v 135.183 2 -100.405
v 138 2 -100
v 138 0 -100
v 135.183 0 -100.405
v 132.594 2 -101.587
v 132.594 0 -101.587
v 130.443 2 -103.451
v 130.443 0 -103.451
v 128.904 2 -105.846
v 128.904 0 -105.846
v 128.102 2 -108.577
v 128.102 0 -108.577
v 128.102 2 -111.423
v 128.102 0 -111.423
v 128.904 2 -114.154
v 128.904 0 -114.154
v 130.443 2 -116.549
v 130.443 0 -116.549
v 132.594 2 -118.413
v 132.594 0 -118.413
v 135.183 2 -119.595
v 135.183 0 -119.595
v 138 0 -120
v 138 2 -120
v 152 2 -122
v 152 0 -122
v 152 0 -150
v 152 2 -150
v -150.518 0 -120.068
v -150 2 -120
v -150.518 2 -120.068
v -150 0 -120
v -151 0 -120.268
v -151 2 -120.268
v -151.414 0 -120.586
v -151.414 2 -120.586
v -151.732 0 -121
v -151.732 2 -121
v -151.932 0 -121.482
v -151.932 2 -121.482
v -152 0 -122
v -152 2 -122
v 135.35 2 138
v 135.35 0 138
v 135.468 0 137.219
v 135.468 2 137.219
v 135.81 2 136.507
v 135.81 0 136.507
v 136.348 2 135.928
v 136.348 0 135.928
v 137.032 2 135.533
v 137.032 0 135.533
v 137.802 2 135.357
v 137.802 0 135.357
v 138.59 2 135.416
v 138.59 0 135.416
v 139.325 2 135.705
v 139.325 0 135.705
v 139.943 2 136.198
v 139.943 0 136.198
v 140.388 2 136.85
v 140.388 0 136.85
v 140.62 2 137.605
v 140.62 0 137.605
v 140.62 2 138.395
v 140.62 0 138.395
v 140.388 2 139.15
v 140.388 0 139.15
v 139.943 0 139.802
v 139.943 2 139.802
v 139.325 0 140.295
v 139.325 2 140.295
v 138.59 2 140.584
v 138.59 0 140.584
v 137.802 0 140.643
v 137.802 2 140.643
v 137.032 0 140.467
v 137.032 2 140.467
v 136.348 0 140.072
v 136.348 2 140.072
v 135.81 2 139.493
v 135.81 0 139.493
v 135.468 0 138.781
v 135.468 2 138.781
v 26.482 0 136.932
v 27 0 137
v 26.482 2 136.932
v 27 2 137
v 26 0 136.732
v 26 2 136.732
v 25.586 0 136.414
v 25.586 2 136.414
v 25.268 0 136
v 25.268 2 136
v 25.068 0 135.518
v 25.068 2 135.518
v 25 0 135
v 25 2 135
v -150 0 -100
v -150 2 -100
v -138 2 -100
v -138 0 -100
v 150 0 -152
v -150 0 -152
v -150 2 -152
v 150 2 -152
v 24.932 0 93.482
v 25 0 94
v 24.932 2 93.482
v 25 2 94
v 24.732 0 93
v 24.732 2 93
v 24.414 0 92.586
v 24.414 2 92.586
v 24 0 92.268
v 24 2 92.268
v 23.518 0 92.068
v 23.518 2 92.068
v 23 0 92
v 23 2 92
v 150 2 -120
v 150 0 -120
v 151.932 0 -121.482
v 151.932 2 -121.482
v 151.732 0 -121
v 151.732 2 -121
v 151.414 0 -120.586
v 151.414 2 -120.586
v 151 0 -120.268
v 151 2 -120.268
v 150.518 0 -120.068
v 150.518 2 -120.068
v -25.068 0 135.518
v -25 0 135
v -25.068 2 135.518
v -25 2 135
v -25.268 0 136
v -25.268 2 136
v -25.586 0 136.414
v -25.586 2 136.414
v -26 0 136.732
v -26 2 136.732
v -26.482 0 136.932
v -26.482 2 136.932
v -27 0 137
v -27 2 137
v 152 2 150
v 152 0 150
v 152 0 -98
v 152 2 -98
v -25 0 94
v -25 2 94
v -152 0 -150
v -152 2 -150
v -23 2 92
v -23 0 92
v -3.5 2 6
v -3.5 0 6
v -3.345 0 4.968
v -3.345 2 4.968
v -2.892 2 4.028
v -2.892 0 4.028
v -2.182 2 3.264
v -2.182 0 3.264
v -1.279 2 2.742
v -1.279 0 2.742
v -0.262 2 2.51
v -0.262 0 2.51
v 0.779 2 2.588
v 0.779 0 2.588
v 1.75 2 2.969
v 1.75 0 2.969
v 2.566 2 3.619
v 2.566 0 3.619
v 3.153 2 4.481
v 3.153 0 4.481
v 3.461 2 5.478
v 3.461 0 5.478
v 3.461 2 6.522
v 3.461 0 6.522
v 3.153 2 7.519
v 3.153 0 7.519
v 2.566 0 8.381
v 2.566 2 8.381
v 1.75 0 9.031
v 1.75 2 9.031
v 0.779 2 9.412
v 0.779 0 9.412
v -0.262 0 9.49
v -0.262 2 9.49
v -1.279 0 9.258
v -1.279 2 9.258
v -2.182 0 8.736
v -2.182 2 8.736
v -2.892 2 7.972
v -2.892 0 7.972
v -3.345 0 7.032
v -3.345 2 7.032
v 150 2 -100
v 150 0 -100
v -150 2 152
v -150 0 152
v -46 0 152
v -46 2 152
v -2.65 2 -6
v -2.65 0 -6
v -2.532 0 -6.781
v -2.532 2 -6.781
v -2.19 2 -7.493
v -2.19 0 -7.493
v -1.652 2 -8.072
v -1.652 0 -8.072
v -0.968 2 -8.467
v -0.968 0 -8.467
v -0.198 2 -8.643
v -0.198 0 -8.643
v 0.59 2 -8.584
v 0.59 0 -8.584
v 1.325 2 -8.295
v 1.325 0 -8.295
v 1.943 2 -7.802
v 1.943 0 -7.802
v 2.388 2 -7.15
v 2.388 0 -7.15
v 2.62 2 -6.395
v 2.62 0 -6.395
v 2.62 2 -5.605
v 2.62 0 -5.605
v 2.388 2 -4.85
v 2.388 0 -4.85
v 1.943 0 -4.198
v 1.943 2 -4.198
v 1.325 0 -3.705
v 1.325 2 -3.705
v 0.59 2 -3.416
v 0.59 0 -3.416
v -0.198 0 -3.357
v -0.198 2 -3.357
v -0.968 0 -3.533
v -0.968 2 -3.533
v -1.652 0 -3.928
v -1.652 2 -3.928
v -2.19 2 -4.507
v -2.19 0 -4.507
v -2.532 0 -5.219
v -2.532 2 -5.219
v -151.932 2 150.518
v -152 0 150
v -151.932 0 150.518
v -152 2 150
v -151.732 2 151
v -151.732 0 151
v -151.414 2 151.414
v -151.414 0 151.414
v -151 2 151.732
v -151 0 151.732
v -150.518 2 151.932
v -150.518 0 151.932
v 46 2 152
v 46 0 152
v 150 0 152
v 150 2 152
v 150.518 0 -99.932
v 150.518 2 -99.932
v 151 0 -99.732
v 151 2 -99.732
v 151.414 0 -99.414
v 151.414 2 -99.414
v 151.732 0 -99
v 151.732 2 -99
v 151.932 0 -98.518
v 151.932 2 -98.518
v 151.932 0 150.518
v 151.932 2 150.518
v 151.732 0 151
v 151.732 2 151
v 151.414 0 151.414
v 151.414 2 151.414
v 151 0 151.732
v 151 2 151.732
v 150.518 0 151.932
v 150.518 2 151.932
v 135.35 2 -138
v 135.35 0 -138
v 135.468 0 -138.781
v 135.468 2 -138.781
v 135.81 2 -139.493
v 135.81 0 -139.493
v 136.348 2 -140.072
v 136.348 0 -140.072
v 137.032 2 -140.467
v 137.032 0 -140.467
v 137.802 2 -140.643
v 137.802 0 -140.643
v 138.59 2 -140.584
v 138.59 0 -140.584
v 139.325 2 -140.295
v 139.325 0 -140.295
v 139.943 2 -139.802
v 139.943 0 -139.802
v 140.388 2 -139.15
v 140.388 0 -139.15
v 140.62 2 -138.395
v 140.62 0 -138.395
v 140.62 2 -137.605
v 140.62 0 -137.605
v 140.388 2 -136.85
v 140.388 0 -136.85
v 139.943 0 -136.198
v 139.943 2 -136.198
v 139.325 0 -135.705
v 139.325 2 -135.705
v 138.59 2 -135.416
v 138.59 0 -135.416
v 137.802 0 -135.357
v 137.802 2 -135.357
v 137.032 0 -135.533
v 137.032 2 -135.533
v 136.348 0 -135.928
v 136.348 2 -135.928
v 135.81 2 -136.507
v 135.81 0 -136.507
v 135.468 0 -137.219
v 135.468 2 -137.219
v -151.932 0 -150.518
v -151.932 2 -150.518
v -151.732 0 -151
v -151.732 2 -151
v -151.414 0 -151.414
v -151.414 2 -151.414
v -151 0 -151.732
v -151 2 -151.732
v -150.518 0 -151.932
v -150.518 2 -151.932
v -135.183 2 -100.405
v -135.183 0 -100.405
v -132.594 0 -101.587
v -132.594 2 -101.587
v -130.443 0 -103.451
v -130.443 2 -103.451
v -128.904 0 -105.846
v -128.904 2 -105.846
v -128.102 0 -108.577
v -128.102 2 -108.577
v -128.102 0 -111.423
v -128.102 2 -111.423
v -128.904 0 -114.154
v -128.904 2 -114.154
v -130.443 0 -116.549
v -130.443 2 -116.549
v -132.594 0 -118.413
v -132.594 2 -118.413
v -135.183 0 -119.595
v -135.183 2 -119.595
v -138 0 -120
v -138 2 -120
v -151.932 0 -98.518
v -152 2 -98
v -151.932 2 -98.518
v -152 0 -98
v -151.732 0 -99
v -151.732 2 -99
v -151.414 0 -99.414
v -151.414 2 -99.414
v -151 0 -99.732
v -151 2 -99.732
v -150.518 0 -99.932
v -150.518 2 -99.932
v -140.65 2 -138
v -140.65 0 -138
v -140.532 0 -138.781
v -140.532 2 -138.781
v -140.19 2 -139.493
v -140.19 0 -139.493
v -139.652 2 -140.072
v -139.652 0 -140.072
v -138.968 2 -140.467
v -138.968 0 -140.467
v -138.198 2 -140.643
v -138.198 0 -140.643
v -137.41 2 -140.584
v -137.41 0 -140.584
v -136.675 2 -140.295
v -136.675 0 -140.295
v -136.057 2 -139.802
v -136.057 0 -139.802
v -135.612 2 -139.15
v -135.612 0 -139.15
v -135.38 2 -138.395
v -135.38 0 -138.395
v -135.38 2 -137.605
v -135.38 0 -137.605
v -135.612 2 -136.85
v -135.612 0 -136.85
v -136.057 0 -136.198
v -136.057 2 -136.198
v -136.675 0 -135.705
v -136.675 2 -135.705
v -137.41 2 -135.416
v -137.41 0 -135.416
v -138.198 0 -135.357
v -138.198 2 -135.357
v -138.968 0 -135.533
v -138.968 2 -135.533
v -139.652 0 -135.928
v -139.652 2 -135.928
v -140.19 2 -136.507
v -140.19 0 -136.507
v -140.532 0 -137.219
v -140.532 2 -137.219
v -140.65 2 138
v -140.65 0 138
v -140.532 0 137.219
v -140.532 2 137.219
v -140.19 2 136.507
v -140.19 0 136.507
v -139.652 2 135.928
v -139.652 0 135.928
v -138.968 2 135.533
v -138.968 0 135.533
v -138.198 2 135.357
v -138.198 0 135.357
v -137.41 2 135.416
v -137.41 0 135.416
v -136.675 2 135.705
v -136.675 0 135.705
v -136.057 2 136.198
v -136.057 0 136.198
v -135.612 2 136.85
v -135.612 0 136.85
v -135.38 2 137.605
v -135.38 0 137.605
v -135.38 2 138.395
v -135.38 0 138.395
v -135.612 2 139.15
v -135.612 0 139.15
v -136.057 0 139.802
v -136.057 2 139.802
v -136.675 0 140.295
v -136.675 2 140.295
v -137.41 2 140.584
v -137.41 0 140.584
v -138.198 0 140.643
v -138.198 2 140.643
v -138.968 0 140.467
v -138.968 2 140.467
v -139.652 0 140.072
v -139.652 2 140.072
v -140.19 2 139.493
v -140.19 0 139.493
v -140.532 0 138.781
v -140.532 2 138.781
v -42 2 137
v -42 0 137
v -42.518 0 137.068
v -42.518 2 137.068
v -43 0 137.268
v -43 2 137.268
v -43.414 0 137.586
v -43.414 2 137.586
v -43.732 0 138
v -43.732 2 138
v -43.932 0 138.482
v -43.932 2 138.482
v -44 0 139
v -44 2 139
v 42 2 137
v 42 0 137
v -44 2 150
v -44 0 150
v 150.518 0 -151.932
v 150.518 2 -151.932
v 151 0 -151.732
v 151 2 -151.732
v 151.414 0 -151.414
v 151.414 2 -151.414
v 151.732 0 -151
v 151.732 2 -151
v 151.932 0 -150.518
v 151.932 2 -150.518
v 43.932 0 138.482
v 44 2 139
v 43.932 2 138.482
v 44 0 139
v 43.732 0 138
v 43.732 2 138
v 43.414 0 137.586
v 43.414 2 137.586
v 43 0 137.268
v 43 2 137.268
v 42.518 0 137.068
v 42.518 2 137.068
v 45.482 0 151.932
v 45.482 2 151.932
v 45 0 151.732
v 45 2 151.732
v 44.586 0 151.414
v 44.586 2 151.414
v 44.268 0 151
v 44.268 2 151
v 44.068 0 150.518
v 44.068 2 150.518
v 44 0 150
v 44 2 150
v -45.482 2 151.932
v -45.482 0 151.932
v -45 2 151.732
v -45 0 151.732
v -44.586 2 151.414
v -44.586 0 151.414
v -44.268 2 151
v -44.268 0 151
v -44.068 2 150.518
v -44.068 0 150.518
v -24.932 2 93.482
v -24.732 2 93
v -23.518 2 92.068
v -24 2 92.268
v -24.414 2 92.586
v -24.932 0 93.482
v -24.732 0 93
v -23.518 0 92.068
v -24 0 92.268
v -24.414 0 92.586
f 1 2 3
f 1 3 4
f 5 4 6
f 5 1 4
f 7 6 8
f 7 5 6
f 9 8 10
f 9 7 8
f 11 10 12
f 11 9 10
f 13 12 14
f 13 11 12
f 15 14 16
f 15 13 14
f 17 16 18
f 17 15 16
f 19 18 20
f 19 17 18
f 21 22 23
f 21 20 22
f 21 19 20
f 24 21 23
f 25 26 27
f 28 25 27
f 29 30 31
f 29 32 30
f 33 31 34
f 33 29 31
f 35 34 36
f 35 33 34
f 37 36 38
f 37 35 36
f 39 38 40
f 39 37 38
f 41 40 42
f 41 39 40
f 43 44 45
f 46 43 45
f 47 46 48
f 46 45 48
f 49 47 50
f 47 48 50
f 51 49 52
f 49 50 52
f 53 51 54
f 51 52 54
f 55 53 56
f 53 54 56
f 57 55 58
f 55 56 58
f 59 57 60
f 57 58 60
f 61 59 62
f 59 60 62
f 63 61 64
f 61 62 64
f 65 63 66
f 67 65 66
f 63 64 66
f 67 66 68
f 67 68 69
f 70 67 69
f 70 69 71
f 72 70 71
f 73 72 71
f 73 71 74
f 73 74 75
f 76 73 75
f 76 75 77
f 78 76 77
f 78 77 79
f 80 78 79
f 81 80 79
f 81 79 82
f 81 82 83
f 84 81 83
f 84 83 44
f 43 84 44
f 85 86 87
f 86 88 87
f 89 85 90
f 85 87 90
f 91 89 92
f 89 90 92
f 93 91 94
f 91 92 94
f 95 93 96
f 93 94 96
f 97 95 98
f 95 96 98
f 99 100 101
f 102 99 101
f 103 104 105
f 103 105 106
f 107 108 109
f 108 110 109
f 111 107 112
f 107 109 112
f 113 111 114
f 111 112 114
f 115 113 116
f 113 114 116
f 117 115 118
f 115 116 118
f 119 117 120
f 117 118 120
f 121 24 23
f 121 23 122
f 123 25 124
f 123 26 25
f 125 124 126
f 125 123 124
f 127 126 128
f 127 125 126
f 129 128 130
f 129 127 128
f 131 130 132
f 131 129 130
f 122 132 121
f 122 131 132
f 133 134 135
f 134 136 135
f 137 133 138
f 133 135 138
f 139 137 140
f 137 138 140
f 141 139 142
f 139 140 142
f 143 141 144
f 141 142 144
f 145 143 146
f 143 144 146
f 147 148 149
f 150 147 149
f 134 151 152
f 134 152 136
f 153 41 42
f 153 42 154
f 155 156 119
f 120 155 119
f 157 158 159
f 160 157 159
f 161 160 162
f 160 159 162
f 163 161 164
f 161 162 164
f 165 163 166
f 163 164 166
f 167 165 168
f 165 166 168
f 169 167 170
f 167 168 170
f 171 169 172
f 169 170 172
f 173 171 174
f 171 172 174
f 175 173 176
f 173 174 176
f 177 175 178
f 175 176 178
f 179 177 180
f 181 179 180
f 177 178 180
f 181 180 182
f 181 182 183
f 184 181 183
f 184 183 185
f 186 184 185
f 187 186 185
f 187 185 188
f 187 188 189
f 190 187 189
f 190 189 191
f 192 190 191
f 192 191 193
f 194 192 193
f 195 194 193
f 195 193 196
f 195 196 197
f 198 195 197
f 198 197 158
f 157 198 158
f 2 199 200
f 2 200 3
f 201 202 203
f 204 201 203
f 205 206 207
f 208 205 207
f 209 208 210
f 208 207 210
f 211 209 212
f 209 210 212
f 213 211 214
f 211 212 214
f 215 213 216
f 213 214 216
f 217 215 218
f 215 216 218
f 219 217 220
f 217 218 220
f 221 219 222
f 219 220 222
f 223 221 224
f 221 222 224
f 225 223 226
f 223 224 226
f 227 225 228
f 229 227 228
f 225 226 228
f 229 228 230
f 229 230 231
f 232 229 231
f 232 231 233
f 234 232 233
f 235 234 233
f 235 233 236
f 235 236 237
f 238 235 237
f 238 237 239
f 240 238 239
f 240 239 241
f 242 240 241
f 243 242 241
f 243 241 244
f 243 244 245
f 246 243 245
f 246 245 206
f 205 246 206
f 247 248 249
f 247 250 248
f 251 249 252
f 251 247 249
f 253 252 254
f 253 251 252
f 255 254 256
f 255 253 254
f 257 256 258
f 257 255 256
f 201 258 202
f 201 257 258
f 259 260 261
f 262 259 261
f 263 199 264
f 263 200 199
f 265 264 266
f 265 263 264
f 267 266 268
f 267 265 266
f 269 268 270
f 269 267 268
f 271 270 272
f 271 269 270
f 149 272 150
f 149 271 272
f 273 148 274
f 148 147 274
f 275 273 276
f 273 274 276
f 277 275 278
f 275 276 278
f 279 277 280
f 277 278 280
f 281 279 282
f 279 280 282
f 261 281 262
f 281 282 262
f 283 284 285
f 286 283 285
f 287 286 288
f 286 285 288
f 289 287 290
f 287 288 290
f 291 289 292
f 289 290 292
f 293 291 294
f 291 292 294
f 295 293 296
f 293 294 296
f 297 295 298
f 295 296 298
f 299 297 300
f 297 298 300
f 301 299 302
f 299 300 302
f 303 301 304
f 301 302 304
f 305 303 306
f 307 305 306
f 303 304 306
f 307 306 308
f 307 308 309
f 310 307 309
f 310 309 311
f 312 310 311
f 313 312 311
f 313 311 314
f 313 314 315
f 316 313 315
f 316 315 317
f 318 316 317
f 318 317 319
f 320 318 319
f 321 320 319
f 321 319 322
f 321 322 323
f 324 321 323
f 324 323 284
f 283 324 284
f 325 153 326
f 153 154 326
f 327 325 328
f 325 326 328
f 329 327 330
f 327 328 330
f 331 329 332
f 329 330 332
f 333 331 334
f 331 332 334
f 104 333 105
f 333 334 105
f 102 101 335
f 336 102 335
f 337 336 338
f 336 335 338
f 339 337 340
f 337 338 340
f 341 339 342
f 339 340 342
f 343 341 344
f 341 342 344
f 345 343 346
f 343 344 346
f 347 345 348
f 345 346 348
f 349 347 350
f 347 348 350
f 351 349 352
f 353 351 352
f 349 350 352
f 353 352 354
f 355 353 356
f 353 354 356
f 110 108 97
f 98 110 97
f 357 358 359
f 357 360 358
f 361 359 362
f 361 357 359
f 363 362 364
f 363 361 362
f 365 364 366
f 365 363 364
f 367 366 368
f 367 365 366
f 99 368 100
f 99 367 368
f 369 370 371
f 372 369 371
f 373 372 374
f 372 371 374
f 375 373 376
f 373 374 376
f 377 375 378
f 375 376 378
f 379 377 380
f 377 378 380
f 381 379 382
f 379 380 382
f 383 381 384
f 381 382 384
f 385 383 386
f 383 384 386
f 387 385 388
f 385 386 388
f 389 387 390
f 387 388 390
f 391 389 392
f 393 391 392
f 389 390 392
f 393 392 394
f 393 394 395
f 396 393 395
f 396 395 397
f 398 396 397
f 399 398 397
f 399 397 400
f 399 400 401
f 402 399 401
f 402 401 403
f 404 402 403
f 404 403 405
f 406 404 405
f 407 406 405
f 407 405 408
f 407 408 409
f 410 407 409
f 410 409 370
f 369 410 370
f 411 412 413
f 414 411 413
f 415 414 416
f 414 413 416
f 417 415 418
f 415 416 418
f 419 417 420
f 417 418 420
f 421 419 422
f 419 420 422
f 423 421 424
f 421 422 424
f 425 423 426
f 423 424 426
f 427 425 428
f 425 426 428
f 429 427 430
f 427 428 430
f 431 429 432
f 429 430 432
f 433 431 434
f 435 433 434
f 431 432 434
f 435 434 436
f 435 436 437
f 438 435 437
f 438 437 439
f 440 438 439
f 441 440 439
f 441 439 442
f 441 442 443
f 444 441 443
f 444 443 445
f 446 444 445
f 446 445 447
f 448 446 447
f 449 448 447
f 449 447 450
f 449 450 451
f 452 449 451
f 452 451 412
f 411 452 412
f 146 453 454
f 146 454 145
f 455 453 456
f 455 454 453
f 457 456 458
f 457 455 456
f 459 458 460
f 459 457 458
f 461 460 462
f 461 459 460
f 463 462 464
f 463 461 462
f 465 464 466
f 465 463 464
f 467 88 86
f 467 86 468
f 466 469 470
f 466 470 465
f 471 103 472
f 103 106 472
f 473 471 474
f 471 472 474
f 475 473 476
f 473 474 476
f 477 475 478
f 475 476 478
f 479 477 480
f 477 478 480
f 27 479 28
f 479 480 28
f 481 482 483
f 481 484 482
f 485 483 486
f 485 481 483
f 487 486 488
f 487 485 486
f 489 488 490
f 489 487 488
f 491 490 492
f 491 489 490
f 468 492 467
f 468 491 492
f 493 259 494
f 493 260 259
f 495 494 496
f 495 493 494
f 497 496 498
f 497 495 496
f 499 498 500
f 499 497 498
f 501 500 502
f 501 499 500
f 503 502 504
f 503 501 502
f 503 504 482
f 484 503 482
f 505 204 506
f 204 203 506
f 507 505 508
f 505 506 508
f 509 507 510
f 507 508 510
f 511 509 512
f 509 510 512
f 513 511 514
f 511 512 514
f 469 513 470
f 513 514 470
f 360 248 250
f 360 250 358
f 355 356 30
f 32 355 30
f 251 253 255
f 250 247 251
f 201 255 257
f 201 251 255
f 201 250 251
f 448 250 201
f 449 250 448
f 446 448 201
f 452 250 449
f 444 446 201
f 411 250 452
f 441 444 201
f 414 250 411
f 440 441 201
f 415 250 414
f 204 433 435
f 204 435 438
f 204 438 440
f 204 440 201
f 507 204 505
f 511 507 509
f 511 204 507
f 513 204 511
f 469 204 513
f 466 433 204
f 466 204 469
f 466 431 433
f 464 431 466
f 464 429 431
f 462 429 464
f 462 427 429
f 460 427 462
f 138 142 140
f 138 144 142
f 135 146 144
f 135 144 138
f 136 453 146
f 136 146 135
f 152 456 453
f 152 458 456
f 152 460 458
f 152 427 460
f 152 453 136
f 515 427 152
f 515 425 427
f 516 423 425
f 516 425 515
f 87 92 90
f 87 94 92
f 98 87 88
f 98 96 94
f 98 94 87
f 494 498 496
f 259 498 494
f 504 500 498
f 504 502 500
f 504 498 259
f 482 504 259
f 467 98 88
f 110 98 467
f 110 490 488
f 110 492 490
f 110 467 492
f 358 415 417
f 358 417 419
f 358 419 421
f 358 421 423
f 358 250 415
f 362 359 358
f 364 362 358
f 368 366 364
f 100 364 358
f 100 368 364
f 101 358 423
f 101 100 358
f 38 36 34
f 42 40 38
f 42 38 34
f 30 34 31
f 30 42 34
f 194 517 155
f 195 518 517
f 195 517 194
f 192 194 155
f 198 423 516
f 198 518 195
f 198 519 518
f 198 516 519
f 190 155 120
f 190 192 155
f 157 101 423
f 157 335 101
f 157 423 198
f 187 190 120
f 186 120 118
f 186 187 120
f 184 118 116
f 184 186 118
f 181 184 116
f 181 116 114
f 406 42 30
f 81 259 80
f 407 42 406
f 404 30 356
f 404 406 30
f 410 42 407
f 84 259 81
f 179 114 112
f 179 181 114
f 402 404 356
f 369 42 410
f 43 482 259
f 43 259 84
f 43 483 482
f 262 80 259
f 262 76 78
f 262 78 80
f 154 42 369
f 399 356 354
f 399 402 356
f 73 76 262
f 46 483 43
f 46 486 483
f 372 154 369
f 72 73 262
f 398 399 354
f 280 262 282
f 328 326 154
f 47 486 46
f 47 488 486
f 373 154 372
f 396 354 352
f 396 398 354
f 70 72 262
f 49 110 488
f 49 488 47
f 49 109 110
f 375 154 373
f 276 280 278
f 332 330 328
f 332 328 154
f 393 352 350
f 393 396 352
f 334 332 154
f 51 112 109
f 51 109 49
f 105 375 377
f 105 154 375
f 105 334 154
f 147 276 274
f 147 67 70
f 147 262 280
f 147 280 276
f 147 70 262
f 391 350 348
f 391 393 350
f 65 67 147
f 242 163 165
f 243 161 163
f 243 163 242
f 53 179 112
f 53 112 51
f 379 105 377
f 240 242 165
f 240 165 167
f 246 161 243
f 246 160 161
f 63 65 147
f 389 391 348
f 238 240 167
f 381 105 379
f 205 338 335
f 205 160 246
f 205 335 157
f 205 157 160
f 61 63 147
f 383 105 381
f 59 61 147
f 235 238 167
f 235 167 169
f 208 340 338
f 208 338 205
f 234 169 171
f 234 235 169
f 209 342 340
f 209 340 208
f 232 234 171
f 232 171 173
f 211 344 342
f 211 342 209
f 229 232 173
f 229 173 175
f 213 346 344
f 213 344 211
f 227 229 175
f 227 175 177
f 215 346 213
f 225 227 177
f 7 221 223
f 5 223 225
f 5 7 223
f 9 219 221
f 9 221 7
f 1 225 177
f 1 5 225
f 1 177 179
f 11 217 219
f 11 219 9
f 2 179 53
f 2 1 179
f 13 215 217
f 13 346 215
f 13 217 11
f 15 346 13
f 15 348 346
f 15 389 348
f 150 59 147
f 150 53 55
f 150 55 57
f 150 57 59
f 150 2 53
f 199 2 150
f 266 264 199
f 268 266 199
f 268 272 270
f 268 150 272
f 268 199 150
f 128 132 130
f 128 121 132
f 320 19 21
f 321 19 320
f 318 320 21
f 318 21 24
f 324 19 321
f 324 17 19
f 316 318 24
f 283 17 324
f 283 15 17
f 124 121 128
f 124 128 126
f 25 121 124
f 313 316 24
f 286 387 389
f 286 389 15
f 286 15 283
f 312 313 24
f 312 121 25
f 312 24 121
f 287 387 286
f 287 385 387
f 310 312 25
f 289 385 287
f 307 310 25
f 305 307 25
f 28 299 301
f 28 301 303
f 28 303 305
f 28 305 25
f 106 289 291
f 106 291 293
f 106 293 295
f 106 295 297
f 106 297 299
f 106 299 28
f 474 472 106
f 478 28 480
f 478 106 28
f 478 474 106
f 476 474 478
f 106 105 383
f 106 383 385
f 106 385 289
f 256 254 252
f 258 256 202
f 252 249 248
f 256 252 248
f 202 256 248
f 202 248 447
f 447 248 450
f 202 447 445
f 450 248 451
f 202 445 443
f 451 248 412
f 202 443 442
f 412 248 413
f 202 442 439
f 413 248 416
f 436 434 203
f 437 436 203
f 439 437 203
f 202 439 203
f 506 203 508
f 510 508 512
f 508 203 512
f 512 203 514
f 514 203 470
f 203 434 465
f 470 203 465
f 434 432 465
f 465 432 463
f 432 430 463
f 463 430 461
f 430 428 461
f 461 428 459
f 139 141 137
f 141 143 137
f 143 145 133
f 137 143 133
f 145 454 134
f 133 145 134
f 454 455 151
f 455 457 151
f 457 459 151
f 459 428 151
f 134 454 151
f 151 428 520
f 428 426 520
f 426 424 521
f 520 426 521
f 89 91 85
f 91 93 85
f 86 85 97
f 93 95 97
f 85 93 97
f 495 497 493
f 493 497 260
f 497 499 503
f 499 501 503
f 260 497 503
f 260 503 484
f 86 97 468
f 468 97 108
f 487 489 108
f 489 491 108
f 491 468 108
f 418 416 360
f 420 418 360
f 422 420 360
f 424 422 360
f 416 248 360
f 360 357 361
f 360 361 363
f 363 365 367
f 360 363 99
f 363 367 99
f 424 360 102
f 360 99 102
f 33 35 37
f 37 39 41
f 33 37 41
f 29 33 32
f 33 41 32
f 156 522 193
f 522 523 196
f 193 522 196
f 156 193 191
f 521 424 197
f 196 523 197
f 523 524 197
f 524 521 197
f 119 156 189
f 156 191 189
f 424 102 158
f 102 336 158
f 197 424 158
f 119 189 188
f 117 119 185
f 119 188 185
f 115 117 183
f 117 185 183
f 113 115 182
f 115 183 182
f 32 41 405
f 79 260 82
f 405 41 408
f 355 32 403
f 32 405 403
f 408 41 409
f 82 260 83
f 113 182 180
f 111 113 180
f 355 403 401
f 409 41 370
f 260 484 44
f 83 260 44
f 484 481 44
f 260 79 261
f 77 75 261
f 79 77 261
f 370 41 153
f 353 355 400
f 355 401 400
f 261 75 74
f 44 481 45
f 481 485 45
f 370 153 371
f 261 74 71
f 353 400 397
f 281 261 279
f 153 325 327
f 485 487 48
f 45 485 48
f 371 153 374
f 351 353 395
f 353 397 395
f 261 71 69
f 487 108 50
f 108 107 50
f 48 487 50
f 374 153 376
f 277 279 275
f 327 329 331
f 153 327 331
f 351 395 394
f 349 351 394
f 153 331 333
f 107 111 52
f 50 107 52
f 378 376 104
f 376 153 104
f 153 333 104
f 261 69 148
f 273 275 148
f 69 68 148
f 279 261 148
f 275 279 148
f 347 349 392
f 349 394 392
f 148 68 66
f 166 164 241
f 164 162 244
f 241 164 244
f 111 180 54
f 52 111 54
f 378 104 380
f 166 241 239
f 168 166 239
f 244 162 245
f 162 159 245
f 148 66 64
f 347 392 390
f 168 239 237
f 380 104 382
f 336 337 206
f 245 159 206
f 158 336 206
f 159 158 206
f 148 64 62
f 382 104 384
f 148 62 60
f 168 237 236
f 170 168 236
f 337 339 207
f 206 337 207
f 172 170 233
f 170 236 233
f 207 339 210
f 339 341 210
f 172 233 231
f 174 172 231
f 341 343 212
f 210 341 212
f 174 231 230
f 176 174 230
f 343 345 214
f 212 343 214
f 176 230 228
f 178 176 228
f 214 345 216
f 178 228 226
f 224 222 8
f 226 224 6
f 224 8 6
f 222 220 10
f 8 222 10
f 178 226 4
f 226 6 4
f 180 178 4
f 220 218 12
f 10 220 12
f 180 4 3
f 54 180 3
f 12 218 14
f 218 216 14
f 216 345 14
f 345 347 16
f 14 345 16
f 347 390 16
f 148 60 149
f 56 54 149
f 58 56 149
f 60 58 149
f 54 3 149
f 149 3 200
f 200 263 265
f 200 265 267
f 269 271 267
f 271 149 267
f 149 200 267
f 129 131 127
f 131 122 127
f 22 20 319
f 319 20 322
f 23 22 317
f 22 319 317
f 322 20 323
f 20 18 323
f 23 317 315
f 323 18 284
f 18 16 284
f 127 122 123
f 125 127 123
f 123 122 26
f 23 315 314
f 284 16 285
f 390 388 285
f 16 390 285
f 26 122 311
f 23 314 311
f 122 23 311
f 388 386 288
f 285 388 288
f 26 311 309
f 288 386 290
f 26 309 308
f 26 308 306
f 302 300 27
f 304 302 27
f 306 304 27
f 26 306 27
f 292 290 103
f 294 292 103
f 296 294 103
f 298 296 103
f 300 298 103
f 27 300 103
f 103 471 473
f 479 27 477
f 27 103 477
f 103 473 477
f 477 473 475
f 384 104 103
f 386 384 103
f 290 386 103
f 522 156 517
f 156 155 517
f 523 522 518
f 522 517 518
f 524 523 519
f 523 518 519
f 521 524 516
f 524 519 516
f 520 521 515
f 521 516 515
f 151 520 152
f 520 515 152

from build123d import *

# Parameters (mm, degrees)
SKETCH1_W                = 304
SKETCH1_H                = 304
BOSS_EXTRUDE1_DEPTH      = 2
SKETCH2_W                = 88
SKETCH2_H                = 15
CUT_EXTRUDE1_DEPTH       = 215.969765316
SKETCH7_W                = 50
SKETCH7_H                = 45
CUT_EXTRUDE2_DEPTH       = 2
FILLET1_R                = 2
F_7_0_7_DIAMETER_HOLE1_D = 7
M5_CLEARANCE_HOLE1_D     = 5.3


with BuildPart() as part:
    # Sketch1 → Boss-Extrude1 (new body)
    with BuildSketch(Plane(origin=(0, 0, 0), x_dir=(1, 0, 0), z_dir=(0, 1, 0))):
        Rectangle(SKETCH1_W, SKETCH1_H)
    extrude(amount=BOSS_EXTRUDE1_DEPTH)

    # Sketch2 → Cut-Extrude1 (cut, through all)
    with BuildSketch(Plane(origin=(0, 2, 0), x_dir=(1, 0, 0), z_dir=(0, 1, 0))):
        with Locations((0, -144.5)):
            Rectangle(SKETCH2_W, SKETCH2_H)
        with BuildLine():
            Line((-152, 100), (-138, 100))
            ThreePointArc((-138, 100), (-128, 110), (-138, 120))
            Line((-138, 120), (-152, 120))
            Line((-152, 120), (-152, 100))
        make_face()
        with BuildLine():
            Line((152, 100), (138, 100))
            ThreePointArc((138, 100), (128, 110), (138, 120))
            Line((138, 120), (152, 120))
            Line((152, 120), (152, 100))
        make_face()
    extrude(amount=-CUT_EXTRUDE1_DEPTH, mode=Mode.SUBTRACT)

    # Sketch7 → Cut-Extrude2 (cut)
    with BuildSketch(Plane.XZ):
        with Locations((0, 114.5)):
            Rectangle(SKETCH7_W, SKETCH7_H)
    extrude(amount=-CUT_EXTRUDE2_DEPTH, mode=Mode.SUBTRACT)

    # Fillet1
    fillet1_edges = [part.edges().sort_by_distance(p)[0] for p in [
        (44, 1, 152),
        (-44, 1, 152),
        (-44, 1, 137),
        (44, 1, 137),
        (-152, 1, -100),
        (-152, 1, -120),
        (152, 1, -120),
        (152, 1, -100),
        (25, 1, 92),
        (25, 1, 137),
        (-25, 1, 137),
        (-25, 1, 92),
        (-152, 1, -152),
        (152, 1, -152),
        (152, 1, 152),
        (-152, 1, 152),
    ]]
    fillet(fillet1_edges, radius=FILLET1_R)

    # Ø7.0 (7) Diameter Hole1 (through all)
    with Locations(Plane(origin=(0, 2, 0), x_dir=(1, 0, 0), z_dir=(0, 1, 0))):
        with Locations((0, -6)):
            Hole(F_7_0_7_DIAMETER_HOLE1_D / 2)

    # M5 Clearance Hole1 (through all)
    with Locations(Plane(origin=(0, 2, 0), x_dir=(1, 0, 0), z_dir=(0, 1, 0))):
        with Locations((-138, 138), (138, 138), (138, -138), (-138, -138), (0, 6)):
            Hole(M5_CLEARANCE_HOLE1_D / 2)


solid = part.part
